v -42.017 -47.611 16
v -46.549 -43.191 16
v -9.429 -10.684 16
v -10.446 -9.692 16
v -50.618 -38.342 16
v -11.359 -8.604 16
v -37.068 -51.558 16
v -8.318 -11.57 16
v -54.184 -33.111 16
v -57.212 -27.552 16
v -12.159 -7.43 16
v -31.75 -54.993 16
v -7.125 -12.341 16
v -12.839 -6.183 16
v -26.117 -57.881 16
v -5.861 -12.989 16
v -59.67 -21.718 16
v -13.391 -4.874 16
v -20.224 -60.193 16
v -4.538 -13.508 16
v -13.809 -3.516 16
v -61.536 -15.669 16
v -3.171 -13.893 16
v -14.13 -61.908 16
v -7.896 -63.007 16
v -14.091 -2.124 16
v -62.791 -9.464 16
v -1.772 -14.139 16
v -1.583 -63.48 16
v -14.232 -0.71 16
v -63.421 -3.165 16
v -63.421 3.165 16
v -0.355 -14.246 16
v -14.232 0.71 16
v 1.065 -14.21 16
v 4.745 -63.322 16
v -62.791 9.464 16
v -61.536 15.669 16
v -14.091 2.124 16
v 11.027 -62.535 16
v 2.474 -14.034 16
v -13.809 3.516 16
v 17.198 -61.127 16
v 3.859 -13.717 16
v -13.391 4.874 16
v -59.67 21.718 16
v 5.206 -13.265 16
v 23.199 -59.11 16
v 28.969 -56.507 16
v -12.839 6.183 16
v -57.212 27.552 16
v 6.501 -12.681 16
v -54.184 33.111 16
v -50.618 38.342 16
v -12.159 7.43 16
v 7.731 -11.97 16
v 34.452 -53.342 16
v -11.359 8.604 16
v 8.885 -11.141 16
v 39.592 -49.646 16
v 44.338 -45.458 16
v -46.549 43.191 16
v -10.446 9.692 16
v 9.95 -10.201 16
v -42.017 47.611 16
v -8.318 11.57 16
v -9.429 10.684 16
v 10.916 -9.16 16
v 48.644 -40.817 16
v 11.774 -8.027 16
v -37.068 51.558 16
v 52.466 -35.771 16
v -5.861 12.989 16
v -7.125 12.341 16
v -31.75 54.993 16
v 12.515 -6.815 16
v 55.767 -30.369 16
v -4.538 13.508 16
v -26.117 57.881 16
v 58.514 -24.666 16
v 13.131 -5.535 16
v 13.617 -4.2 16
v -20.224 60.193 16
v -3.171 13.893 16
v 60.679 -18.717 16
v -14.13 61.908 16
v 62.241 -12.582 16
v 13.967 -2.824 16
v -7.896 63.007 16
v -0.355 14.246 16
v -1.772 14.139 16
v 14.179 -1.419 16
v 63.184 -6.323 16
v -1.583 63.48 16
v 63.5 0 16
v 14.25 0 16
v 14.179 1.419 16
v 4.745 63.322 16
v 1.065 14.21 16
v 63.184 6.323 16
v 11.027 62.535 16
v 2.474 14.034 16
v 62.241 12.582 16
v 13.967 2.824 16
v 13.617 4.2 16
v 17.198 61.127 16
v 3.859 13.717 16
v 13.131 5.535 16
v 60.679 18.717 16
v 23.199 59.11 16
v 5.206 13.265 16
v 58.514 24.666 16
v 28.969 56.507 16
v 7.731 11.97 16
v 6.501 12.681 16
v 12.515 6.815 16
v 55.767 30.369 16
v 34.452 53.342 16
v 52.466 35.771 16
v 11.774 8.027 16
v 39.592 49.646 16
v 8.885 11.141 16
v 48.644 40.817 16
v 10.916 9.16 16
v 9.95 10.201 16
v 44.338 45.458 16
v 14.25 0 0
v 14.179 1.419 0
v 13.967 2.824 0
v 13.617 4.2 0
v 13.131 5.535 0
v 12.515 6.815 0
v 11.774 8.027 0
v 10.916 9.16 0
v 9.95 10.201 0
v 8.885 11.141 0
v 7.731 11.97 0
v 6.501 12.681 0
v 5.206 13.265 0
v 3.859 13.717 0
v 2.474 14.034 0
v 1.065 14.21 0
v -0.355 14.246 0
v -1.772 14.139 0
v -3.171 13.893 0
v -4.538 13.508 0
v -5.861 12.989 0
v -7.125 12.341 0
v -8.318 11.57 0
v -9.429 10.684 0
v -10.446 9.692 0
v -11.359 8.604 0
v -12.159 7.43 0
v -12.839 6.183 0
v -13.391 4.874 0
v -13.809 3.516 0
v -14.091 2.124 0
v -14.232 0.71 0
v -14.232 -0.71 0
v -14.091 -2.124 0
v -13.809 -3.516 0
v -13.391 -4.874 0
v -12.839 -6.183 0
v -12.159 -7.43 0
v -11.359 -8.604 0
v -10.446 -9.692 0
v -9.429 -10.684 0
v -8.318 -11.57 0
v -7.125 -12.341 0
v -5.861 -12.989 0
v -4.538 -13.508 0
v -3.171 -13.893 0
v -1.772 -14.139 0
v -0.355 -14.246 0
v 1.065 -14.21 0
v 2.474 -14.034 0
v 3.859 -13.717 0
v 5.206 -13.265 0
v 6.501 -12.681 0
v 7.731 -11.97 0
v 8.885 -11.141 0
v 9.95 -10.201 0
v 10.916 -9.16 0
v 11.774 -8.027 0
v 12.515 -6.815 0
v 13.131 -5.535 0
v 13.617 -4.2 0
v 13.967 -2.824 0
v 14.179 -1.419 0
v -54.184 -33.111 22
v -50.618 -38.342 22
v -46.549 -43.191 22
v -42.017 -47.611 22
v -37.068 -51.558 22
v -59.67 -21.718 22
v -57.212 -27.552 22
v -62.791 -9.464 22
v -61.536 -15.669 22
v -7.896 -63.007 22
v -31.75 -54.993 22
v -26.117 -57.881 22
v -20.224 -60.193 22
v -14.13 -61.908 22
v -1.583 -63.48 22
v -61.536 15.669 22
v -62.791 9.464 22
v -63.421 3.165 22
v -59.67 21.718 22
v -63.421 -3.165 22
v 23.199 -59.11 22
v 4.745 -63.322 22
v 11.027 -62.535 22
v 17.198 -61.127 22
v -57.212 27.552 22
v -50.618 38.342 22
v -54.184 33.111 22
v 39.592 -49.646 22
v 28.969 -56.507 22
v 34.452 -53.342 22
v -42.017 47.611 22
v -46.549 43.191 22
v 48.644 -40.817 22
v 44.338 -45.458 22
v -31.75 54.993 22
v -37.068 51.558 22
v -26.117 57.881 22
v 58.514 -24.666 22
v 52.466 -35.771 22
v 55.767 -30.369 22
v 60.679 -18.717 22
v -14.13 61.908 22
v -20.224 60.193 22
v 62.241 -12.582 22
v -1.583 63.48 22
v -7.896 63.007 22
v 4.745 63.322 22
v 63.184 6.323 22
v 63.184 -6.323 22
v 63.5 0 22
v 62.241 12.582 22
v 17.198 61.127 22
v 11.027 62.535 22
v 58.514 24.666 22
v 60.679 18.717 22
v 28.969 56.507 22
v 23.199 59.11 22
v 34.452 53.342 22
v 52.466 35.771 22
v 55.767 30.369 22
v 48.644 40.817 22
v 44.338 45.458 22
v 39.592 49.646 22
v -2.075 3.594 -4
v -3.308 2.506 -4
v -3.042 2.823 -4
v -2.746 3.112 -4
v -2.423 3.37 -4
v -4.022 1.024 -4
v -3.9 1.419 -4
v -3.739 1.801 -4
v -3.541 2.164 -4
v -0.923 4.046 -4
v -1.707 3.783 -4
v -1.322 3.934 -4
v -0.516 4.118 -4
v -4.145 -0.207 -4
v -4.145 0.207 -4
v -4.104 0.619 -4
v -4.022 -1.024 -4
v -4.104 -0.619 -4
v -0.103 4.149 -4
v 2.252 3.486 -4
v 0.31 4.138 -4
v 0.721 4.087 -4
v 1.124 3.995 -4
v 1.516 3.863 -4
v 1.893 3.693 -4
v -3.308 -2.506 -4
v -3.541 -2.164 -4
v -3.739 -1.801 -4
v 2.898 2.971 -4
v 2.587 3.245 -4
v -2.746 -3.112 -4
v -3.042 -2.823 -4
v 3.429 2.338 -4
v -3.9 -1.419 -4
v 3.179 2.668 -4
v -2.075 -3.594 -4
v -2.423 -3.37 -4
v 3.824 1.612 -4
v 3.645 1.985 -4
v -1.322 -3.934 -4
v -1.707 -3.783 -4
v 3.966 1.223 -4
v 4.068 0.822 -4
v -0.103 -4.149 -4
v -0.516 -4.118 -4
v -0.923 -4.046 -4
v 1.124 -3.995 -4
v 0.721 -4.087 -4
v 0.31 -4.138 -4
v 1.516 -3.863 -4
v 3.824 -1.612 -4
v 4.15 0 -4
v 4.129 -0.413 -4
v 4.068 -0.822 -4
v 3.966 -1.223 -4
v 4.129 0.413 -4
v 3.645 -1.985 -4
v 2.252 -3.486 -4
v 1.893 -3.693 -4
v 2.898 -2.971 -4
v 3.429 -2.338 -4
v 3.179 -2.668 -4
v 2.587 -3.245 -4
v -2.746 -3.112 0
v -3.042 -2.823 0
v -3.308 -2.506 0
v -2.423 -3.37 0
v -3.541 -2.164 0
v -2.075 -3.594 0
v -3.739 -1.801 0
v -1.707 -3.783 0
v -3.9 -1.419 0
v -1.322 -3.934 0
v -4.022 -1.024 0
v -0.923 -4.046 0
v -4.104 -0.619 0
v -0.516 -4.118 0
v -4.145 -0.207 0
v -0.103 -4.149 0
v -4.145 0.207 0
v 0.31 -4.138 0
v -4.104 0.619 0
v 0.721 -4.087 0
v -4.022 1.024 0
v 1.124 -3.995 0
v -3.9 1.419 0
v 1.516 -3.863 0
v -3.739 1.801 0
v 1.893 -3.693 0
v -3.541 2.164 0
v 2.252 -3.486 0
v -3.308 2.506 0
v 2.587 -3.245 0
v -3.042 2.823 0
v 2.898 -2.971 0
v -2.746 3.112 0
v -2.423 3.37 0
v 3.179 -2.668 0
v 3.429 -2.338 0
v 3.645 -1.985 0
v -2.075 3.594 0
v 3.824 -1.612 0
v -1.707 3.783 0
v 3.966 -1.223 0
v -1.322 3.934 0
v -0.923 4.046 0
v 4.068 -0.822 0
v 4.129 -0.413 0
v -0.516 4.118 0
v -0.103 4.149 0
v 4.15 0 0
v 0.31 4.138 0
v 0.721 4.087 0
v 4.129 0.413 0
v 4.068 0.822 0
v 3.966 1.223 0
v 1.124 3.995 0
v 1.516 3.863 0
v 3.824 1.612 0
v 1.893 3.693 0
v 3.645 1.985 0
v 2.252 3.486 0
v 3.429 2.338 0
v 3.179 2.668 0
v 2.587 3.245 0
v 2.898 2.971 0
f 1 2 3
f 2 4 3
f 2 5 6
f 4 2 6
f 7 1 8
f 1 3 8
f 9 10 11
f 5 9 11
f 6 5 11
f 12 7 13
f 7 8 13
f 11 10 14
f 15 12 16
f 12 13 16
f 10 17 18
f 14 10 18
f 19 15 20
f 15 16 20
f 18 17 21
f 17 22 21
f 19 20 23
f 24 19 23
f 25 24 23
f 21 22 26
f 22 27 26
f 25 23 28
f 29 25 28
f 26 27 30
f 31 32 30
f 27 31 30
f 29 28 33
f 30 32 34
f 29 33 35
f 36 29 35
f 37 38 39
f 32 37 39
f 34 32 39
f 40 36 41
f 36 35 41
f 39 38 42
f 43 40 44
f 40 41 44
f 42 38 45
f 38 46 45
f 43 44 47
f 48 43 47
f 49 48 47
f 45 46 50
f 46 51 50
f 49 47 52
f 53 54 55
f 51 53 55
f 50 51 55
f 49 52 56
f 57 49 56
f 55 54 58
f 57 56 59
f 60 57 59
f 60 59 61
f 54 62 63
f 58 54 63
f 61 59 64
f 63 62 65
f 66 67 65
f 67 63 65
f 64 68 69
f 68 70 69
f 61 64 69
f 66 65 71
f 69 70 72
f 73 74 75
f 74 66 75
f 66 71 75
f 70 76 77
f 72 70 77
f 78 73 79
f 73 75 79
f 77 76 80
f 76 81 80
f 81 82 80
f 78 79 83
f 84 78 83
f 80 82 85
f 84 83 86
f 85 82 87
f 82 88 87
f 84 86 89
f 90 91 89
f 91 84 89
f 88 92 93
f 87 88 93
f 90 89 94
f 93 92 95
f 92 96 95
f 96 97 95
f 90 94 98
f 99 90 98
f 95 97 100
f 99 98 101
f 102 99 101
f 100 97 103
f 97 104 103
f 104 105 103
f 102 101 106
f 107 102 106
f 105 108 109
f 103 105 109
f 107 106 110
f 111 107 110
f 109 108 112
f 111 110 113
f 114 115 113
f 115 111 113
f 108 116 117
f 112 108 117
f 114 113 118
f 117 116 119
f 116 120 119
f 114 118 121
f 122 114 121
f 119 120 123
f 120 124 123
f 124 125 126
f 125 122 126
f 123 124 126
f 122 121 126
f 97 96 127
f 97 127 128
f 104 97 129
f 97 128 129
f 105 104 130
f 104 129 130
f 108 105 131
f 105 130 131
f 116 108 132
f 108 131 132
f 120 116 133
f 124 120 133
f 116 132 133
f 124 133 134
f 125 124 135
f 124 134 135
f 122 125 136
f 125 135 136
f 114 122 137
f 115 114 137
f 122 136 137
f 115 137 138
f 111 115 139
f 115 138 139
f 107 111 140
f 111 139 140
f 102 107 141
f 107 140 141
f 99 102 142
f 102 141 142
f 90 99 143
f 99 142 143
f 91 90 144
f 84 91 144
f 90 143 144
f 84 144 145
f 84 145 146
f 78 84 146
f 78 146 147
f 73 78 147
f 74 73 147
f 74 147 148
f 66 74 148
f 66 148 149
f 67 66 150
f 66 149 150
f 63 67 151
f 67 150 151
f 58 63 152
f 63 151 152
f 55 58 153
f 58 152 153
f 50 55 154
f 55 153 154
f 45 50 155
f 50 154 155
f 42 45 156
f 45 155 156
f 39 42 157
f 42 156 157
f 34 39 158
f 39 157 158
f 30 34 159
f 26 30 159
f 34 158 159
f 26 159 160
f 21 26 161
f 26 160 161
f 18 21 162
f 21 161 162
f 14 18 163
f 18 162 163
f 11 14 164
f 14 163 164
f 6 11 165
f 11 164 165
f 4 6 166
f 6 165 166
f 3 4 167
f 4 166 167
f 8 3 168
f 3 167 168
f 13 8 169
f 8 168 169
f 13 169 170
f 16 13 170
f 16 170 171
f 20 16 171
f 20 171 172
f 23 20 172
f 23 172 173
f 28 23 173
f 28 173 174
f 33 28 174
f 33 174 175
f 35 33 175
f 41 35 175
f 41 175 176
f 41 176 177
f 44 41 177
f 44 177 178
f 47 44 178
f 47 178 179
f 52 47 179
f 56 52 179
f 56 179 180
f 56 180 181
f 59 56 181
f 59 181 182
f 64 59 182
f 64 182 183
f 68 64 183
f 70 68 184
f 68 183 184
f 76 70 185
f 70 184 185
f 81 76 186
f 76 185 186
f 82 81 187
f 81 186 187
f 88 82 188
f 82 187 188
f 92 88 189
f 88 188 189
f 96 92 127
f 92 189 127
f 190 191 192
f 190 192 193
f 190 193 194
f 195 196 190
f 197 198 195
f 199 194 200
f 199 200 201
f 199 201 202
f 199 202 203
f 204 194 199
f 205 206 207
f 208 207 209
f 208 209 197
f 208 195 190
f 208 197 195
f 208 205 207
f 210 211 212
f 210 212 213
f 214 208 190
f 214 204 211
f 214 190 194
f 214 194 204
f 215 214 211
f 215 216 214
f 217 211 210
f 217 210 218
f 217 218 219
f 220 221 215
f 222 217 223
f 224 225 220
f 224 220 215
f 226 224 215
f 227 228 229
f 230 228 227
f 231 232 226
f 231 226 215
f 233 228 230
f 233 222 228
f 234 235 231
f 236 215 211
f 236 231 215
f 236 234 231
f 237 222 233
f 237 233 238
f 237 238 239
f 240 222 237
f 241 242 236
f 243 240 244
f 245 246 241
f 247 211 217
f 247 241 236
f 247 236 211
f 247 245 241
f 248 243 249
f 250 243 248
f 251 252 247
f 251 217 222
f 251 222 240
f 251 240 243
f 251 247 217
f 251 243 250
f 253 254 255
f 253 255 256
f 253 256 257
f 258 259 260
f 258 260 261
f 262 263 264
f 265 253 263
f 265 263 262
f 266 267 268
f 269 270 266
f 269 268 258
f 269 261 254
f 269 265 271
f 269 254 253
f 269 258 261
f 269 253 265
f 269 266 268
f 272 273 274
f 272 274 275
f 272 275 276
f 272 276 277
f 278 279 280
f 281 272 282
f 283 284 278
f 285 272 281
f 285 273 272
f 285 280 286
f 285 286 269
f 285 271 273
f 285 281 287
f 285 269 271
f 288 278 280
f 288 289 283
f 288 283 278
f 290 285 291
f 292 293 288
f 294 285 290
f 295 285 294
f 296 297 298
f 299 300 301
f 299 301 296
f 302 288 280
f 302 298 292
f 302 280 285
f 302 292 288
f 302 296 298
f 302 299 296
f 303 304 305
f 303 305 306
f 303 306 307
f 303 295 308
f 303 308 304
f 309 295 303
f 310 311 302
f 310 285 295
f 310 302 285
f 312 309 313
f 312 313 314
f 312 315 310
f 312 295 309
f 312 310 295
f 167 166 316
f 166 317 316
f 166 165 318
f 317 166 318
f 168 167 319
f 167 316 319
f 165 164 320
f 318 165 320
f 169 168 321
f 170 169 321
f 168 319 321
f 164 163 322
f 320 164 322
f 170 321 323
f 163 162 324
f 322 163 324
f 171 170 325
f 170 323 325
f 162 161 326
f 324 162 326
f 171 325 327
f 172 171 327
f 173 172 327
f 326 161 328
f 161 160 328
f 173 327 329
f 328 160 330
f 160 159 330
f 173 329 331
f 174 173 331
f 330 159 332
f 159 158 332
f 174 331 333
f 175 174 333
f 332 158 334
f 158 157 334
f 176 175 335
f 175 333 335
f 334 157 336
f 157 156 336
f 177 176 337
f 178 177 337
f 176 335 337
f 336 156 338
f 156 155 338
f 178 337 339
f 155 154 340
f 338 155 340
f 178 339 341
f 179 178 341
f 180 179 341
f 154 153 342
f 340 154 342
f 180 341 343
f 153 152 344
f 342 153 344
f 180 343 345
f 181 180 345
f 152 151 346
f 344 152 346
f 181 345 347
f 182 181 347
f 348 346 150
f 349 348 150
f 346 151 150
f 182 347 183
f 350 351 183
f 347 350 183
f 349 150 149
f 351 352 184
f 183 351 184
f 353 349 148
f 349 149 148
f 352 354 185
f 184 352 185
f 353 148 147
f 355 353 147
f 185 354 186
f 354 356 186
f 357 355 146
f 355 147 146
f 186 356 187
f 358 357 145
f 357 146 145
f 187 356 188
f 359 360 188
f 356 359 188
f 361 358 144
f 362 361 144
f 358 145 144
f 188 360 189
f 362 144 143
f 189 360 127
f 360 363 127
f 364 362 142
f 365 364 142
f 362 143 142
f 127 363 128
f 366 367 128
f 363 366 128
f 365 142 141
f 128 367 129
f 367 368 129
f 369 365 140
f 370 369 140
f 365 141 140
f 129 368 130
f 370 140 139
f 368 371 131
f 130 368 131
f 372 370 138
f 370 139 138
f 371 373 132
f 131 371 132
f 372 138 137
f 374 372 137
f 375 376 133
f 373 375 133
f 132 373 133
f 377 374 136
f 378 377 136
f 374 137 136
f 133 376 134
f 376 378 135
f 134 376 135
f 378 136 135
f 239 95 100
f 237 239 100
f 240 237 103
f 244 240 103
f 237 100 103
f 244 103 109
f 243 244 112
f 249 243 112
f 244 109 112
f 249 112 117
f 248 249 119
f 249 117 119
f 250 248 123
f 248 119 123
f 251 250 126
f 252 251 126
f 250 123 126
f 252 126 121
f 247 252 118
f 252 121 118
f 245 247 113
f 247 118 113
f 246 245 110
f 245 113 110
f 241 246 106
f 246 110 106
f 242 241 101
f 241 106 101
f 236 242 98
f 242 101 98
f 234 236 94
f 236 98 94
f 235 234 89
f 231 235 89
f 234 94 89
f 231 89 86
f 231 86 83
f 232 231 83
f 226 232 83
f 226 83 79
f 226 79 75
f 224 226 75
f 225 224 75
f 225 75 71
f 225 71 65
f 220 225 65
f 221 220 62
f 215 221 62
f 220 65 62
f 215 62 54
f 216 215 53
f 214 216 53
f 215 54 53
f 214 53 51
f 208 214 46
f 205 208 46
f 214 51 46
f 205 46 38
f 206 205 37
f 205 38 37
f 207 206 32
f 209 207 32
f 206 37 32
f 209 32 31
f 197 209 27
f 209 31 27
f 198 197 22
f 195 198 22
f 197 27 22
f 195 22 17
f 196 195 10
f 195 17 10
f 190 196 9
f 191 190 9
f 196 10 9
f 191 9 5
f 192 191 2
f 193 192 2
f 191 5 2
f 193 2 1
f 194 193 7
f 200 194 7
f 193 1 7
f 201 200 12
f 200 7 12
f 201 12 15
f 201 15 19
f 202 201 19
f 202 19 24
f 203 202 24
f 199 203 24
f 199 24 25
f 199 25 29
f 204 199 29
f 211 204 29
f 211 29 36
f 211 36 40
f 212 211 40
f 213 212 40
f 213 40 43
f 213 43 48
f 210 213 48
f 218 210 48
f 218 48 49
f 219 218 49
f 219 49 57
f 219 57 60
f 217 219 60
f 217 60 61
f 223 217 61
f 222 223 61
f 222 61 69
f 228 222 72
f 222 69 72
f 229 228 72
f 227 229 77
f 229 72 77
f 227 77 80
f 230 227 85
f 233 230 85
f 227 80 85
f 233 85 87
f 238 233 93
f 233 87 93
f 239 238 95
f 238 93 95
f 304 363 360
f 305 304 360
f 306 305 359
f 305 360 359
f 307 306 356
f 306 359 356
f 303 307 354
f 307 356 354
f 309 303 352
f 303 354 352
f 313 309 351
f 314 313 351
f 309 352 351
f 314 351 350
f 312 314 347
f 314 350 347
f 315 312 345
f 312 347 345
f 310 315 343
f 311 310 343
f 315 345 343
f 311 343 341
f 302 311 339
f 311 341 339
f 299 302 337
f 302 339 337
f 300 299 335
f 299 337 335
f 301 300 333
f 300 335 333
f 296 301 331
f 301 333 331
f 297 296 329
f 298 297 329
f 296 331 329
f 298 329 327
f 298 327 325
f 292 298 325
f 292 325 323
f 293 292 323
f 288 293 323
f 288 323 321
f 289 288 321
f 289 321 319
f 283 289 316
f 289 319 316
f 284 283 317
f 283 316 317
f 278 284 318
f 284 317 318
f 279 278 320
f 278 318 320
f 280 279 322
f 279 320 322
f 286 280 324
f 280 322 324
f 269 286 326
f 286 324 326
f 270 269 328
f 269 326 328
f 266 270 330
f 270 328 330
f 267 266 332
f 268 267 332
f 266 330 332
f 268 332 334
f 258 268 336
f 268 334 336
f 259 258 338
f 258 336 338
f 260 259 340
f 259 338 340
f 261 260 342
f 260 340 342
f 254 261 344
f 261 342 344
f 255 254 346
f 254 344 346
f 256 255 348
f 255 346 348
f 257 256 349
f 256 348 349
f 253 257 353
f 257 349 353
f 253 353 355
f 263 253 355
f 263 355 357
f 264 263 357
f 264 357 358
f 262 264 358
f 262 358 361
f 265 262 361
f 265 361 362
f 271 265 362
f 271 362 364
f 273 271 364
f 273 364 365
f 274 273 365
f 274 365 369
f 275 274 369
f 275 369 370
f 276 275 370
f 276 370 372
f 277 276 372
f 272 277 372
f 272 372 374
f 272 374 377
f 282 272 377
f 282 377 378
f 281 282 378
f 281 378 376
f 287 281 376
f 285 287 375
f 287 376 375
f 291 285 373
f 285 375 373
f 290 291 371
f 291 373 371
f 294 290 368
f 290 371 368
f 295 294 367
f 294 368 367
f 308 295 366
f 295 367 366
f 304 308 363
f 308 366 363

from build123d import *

# Parameters (mm, degrees)
F0_R     = 14.25
F0_R_2   = 2.5
F1_DEPTH = 16
F2_DEPTH = 19
F3_R     = 63.5
F4_DEPTH = 6
F5_R     = 4.15
F6_DEPTH = 4


with BuildPart() as f1:
    # F0 (on Top) → F1 (new body)
    with BuildSketch(Plane.XY):
        Circle(F0_R)
        Circle(F0_R_2, mode=Mode.SUBTRACT)
    extrude(amount=F1_DEPTH)

    # F0 (on Top) → F2 (join)
    with BuildSketch(Plane.XY):
        Circle(F0_R_2)
    extrude(amount=F2_DEPTH)

    # F3 (on face) → F4 (join)
    with BuildSketch(Plane.XY.offset(16)):
        Circle(F3_R)
    extrude(amount=F4_DEPTH)

    # F5 (on face) → F6 (join)
    with BuildSketch(Plane(origin=(0, 0, 0), x_dir=(1, 0, 0), z_dir=(0, 0, -1))):
        Circle(F5_R)
    extrude(amount=F6_DEPTH)


solid = f1.part
